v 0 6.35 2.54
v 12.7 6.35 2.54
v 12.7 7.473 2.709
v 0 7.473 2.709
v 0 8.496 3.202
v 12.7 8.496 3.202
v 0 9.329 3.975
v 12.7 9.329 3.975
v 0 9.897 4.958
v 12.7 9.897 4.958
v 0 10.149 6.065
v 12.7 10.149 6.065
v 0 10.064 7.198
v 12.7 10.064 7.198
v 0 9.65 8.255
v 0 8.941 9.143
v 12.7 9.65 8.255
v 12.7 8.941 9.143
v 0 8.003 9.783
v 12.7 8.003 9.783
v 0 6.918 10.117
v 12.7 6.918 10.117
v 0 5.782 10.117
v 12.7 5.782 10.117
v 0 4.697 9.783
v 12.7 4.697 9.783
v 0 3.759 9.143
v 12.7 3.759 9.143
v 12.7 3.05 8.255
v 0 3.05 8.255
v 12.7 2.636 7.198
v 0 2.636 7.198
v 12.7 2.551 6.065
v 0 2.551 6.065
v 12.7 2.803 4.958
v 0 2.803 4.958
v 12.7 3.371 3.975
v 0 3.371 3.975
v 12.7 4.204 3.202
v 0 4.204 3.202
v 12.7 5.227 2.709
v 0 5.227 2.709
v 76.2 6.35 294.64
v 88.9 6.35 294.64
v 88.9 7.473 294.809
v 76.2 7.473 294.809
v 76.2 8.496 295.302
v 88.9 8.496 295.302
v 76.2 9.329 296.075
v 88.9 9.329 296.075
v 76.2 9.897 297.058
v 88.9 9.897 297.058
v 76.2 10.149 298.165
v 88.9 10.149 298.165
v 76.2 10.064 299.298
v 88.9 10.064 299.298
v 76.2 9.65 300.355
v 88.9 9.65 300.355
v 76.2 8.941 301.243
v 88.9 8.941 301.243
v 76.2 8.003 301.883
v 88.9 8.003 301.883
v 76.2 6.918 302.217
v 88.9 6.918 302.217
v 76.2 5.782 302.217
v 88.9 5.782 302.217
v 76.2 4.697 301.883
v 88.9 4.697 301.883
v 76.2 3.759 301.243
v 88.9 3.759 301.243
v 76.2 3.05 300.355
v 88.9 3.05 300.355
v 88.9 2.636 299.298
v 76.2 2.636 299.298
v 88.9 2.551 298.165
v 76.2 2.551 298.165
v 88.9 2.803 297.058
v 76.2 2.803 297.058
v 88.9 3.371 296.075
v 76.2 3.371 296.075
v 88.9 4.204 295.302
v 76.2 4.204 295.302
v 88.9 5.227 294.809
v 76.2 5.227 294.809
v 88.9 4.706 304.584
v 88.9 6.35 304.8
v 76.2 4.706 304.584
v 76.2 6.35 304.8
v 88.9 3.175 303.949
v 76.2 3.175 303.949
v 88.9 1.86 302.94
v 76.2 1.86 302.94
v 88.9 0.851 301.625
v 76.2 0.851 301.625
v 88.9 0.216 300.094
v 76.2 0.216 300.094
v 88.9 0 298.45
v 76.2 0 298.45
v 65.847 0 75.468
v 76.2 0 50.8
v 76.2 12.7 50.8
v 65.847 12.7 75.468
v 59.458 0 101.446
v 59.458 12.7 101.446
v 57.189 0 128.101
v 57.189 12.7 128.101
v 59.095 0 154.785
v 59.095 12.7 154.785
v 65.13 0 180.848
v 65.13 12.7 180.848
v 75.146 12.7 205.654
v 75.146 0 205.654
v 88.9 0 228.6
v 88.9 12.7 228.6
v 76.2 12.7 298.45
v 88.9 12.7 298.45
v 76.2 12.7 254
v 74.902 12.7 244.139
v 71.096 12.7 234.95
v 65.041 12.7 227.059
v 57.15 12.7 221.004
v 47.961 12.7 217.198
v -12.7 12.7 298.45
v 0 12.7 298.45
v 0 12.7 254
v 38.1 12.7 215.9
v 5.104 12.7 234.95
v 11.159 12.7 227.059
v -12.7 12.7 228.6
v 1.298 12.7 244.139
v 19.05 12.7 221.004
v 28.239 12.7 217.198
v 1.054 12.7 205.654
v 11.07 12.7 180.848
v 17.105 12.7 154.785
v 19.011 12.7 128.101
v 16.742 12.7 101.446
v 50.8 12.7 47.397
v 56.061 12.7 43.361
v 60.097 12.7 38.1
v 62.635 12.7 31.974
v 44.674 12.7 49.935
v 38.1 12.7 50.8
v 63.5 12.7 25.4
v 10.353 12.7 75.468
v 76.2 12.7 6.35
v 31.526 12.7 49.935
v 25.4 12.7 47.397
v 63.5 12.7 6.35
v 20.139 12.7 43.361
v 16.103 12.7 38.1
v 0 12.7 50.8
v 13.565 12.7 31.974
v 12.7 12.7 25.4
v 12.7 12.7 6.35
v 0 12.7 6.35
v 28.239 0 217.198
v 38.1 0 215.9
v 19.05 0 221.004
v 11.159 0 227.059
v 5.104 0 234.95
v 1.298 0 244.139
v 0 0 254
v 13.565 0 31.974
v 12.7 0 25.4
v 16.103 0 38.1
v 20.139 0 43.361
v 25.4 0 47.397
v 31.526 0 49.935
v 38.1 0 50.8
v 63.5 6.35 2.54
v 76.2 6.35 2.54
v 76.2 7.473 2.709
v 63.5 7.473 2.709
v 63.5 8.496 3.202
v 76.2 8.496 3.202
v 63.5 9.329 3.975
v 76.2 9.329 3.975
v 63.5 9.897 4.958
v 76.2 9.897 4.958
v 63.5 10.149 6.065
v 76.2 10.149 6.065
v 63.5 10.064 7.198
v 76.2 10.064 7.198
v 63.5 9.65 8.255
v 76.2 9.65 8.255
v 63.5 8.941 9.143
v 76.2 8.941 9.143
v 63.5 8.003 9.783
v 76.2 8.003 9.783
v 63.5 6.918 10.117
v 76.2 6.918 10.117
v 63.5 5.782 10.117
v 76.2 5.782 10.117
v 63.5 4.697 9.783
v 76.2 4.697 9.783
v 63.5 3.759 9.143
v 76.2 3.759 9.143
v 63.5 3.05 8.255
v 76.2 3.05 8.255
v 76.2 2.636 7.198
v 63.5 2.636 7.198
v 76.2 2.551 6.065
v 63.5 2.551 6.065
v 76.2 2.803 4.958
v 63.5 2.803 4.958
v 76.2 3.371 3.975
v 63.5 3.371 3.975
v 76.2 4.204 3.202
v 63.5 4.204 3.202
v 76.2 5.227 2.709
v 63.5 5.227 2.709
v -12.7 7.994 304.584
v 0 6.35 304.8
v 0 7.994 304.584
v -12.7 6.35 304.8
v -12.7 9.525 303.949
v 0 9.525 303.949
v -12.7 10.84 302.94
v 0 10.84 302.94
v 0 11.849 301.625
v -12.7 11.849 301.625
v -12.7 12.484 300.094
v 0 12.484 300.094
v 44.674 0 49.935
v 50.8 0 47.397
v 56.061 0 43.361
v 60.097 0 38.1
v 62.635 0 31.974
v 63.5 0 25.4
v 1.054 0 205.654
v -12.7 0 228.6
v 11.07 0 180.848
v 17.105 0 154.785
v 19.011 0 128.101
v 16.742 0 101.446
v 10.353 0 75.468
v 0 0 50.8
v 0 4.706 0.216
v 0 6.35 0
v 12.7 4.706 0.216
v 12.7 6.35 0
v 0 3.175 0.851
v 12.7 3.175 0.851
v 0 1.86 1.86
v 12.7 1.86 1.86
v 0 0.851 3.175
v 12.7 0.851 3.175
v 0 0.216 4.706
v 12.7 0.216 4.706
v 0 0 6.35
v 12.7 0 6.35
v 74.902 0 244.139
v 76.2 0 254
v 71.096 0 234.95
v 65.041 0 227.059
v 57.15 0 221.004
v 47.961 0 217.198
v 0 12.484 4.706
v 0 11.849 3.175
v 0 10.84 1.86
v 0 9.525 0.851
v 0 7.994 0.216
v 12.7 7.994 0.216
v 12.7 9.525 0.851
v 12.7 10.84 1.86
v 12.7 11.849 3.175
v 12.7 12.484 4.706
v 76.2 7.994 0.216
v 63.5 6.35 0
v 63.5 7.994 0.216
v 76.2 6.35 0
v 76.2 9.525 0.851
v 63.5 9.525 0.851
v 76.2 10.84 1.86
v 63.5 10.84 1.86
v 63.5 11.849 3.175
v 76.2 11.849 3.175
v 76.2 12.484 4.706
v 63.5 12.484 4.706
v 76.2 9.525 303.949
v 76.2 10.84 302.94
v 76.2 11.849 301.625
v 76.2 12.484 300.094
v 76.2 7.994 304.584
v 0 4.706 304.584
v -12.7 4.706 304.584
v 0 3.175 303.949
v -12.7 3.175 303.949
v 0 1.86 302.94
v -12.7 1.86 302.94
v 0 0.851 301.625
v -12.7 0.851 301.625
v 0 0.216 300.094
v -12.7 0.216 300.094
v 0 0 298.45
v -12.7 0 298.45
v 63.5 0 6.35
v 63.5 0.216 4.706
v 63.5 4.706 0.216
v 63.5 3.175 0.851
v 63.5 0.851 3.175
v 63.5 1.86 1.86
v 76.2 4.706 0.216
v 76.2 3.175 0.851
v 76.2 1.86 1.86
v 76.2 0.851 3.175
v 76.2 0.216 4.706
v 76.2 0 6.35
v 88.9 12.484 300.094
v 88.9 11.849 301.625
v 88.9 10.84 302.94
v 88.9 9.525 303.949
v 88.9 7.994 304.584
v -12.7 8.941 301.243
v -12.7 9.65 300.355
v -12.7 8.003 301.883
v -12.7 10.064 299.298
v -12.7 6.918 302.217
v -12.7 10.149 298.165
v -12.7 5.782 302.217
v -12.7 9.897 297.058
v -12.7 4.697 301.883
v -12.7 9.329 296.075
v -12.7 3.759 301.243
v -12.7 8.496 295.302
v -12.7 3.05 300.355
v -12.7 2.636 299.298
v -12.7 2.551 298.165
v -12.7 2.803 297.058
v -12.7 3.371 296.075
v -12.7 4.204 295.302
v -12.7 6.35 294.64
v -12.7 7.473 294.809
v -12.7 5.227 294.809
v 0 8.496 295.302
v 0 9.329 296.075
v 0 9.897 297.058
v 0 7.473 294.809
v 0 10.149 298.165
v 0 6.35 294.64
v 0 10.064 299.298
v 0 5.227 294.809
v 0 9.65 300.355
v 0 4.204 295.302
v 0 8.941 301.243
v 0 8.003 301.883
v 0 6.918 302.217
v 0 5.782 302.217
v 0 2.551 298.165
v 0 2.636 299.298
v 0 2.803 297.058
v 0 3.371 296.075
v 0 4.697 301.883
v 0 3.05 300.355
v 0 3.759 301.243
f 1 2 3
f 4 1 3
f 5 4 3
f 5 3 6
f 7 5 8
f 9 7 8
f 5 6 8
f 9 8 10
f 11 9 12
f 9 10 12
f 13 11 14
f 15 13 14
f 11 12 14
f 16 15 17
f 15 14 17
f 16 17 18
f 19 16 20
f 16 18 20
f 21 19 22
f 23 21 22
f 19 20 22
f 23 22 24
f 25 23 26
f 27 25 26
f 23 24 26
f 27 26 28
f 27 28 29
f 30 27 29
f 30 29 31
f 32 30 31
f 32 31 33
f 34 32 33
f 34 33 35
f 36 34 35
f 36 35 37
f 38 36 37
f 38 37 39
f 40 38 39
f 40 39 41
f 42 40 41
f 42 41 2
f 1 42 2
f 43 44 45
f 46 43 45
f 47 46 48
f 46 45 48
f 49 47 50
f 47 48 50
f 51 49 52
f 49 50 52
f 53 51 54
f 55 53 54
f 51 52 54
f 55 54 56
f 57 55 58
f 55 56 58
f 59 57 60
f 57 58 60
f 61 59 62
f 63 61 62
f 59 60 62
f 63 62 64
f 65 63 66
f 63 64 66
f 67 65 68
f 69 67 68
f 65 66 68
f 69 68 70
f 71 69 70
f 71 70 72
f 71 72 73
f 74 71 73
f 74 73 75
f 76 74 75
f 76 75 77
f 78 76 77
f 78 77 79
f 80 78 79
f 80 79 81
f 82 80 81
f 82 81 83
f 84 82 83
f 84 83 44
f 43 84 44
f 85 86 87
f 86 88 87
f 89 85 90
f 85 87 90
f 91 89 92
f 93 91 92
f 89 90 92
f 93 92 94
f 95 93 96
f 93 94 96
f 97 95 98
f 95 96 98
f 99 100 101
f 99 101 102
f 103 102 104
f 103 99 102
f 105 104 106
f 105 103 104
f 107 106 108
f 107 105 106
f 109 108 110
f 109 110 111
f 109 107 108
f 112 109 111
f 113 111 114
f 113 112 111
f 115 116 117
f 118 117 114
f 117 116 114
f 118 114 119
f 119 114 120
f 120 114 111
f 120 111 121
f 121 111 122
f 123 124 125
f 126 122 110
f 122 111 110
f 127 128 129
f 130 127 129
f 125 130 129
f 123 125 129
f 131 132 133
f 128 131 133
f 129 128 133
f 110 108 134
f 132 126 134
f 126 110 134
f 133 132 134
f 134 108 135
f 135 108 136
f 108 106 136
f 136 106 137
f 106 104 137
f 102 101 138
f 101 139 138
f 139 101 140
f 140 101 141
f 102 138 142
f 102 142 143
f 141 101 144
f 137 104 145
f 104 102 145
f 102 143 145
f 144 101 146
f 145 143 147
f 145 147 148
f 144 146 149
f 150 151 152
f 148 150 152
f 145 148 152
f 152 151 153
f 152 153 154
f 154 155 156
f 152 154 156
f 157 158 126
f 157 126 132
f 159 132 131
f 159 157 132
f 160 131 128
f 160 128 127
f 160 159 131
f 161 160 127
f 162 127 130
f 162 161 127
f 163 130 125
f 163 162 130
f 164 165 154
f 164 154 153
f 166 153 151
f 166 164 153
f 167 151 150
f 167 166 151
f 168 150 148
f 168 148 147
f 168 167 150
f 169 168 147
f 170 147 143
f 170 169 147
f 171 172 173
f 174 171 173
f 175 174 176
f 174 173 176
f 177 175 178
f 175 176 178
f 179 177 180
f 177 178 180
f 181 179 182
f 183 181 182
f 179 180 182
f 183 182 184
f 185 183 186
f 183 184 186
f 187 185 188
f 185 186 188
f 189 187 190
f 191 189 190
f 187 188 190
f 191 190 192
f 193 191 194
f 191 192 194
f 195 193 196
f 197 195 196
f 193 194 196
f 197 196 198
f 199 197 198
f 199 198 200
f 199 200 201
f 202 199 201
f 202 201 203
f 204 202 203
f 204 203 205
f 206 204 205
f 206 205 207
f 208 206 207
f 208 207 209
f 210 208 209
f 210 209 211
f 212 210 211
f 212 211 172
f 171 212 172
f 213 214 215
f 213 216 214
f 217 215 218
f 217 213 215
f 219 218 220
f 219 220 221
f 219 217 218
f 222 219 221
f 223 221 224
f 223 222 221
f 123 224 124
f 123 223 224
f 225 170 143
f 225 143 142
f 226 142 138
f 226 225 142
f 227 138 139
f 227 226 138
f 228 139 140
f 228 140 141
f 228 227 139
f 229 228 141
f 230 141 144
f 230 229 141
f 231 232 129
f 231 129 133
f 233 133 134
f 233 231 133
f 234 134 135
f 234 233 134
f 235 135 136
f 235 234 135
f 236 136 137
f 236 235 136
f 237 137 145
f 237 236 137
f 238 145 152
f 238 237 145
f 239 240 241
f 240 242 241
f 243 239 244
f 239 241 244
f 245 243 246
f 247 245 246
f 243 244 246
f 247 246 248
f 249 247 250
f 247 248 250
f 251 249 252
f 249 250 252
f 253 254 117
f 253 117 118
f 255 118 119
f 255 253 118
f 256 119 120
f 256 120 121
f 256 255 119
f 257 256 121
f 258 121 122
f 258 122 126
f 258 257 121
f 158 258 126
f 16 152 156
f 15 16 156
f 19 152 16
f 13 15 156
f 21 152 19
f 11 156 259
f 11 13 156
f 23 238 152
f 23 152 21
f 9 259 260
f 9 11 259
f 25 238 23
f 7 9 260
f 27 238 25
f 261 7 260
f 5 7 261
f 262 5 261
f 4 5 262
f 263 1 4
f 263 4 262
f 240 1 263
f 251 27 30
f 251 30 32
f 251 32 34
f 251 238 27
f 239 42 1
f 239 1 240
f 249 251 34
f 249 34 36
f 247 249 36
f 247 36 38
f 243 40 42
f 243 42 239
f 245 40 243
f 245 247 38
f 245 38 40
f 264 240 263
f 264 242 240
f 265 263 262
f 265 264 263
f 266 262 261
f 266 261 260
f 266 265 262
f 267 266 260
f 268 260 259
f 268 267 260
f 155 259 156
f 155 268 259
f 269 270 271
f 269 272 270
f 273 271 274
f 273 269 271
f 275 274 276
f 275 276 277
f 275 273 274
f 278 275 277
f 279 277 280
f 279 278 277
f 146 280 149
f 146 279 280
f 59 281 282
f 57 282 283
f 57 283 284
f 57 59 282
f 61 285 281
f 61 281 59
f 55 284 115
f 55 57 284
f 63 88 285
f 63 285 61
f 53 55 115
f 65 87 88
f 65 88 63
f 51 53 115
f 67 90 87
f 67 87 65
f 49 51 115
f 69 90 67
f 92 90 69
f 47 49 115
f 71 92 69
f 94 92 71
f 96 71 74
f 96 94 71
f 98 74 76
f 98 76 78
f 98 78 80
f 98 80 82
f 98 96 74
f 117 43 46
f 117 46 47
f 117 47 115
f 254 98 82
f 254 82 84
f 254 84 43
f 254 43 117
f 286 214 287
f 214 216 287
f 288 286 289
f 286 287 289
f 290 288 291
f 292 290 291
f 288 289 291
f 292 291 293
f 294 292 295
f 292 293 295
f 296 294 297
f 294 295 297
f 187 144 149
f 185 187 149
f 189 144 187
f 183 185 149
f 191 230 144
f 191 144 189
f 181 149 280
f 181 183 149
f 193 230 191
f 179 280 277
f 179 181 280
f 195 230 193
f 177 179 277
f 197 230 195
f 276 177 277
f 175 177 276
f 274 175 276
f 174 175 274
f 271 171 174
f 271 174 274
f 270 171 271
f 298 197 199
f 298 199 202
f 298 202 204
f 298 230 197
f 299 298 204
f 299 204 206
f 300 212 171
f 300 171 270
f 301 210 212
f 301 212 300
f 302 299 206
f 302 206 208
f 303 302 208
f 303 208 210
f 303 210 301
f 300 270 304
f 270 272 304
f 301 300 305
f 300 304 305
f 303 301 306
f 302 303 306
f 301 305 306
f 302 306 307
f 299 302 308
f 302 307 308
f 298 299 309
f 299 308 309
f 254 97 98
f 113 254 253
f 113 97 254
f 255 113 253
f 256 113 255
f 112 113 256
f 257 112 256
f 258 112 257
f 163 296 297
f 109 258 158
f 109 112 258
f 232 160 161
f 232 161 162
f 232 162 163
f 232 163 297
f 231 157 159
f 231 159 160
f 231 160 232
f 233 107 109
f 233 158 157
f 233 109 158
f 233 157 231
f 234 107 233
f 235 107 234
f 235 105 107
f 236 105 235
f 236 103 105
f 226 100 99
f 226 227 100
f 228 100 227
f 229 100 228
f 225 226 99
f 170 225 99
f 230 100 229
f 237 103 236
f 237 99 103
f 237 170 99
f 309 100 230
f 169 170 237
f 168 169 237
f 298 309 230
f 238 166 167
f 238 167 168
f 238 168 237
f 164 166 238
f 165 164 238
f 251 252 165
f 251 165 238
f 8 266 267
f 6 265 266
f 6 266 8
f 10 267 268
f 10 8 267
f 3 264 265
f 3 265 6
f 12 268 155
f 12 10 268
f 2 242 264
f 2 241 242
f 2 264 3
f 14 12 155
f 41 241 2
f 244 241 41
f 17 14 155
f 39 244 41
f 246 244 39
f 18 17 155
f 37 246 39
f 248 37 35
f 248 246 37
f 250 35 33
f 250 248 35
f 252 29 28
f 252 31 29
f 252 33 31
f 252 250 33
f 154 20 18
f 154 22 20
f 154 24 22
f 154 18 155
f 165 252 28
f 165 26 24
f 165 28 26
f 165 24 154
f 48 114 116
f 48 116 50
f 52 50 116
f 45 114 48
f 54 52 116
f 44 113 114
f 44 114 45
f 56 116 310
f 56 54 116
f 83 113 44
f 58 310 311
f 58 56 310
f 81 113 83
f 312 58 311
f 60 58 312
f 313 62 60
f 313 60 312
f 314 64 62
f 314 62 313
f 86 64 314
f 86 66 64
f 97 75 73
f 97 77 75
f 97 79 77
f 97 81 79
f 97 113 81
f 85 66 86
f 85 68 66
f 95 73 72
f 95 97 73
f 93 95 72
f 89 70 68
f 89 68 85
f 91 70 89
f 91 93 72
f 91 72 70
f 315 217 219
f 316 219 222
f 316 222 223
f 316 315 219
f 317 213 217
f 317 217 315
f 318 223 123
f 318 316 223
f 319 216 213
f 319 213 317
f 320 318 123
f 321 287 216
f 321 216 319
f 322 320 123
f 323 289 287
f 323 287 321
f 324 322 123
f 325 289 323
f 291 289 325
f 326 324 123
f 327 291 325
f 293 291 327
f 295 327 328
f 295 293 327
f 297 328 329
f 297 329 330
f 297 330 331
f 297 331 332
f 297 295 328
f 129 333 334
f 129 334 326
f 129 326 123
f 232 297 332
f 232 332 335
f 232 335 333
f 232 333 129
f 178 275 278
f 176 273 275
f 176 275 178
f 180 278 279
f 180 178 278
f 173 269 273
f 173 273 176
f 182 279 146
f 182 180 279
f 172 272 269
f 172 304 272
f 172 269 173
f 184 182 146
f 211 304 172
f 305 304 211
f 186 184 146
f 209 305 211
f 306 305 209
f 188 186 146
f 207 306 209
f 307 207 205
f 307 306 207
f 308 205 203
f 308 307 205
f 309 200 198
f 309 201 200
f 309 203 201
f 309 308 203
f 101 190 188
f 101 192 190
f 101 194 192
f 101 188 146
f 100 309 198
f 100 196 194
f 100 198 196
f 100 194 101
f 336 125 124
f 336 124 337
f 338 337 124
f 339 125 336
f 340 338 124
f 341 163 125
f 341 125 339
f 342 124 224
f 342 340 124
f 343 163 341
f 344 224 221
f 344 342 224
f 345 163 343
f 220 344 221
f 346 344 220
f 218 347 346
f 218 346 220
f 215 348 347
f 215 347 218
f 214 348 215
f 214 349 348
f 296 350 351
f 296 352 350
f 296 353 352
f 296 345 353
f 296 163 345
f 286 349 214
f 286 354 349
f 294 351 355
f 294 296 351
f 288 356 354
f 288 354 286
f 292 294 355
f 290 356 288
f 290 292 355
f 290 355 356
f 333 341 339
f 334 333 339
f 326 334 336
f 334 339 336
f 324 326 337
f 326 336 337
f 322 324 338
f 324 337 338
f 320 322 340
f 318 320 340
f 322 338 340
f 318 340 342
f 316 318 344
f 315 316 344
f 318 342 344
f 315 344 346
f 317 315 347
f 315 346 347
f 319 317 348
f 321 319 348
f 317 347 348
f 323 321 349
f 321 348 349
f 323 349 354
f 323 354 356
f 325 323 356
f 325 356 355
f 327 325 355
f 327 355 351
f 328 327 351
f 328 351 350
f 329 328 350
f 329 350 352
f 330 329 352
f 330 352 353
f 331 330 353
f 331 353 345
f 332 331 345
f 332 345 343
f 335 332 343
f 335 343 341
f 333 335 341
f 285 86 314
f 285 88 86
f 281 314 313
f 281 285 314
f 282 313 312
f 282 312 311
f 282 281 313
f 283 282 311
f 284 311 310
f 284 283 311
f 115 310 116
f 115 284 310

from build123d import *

# Parameters (mm, degrees)
BOSS_EXTRUDE1_DEPTH = 12.7
FILLET1_R           = 6.35
SKETCH2_R           = 3.81
CUT_EXTRUDE1_DEPTH  = 322.53831809
SKETCH3_R           = 3.81
CUT_EXTRUDE2_DEPTH  = 318.753898481


with BuildPart() as part:
    # Sketch1 → Boss-Extrude1 (new body)
    with BuildSketch(Plane(origin=(0, 0, 0), x_dir=(1, 0, 0), z_dir=(0, 1, 0))):
        with BuildLine():
            Line((0, 0), (12.7, 0))
            Line((12.7, 0), (12.7, -25.4))
            ThreePointArc((12.7, -25.4), (20.139487758, -43.360512242), (38.1, -50.8))
            ThreePointArc((38.1, -50.8), (56.060512242, -43.360512242), (63.5, -25.4))
            Line((63.5, -25.4), (63.5, 0))
            Line((63.5, 0), (76.2, 0))
            Line((76.2, 0), (76.2, -50.8))
            ThreePointArc((76.2, -50.8), (57.621017373, -141.480641616), (88.9, -228.6))
            Line((88.9, -228.6), (88.9, -304.8))
            Line((88.9, -304.8), (76.2, -304.8))
            Line((76.2, -304.8), (76.2, -254))
            ThreePointArc((76.2, -254), (65.040768363, -227.059231637), (38.1, -215.9))
            ThreePointArc((38.1, -215.9), (11.159231637, -227.059231637), (0, -254))
            Line((0, -254), (0, -304.8))
            Line((0, -304.8), (-12.7, -304.8))
            Line((-12.7, -304.8), (-12.7, -228.6))
            ThreePointArc((-12.7, -228.6), (18.578982627, -141.480641616), (0, -50.8))
            Line((0, -50.8), (0, 0))
        make_face()
    extrude(amount=BOSS_EXTRUDE1_DEPTH)

    # Fillet1
    fillet1_edges = [part.edges().sort_by_distance(p)[0] for p in [
        (69.85, 0, 0),
        (6.35, 0, 0),
        (69.85, 12.7, 0),
        (6.35, 12.7, 0),
        (-6.35, 0, 304.8),
        (-6.35, 12.7, 304.8),
        (82.55, 0, 304.8),
        (82.55, 12.7, 304.8),
    ]]
    fillet(fillet1_edges, radius=FILLET1_R - 0.0001)  # a hair under: the kernel refuses the full size

    # Sketch2 → Cut-Extrude1 (cut, through all)
    with BuildSketch(Plane(origin=(88.9, 0, 0), x_dir=(0, 0, -1), z_dir=(1, 0, 0))):
        with Locations((-298.45, 6.35)):
            Circle(SKETCH2_R)
    extrude(amount=-CUT_EXTRUDE1_DEPTH, mode=Mode.SUBTRACT)

    # Sketch3 → Cut-Extrude2 (cut, through all)
    with BuildSketch(Plane(origin=(76.2, 0, 0), x_dir=(0, 0, -1), z_dir=(1, 0, 0))):
        with Locations((-6.35, 6.35)):
            Circle(SKETCH3_R)
    extrude(amount=-CUT_EXTRUDE2_DEPTH, mode=Mode.SUBTRACT)


solid = part.part
